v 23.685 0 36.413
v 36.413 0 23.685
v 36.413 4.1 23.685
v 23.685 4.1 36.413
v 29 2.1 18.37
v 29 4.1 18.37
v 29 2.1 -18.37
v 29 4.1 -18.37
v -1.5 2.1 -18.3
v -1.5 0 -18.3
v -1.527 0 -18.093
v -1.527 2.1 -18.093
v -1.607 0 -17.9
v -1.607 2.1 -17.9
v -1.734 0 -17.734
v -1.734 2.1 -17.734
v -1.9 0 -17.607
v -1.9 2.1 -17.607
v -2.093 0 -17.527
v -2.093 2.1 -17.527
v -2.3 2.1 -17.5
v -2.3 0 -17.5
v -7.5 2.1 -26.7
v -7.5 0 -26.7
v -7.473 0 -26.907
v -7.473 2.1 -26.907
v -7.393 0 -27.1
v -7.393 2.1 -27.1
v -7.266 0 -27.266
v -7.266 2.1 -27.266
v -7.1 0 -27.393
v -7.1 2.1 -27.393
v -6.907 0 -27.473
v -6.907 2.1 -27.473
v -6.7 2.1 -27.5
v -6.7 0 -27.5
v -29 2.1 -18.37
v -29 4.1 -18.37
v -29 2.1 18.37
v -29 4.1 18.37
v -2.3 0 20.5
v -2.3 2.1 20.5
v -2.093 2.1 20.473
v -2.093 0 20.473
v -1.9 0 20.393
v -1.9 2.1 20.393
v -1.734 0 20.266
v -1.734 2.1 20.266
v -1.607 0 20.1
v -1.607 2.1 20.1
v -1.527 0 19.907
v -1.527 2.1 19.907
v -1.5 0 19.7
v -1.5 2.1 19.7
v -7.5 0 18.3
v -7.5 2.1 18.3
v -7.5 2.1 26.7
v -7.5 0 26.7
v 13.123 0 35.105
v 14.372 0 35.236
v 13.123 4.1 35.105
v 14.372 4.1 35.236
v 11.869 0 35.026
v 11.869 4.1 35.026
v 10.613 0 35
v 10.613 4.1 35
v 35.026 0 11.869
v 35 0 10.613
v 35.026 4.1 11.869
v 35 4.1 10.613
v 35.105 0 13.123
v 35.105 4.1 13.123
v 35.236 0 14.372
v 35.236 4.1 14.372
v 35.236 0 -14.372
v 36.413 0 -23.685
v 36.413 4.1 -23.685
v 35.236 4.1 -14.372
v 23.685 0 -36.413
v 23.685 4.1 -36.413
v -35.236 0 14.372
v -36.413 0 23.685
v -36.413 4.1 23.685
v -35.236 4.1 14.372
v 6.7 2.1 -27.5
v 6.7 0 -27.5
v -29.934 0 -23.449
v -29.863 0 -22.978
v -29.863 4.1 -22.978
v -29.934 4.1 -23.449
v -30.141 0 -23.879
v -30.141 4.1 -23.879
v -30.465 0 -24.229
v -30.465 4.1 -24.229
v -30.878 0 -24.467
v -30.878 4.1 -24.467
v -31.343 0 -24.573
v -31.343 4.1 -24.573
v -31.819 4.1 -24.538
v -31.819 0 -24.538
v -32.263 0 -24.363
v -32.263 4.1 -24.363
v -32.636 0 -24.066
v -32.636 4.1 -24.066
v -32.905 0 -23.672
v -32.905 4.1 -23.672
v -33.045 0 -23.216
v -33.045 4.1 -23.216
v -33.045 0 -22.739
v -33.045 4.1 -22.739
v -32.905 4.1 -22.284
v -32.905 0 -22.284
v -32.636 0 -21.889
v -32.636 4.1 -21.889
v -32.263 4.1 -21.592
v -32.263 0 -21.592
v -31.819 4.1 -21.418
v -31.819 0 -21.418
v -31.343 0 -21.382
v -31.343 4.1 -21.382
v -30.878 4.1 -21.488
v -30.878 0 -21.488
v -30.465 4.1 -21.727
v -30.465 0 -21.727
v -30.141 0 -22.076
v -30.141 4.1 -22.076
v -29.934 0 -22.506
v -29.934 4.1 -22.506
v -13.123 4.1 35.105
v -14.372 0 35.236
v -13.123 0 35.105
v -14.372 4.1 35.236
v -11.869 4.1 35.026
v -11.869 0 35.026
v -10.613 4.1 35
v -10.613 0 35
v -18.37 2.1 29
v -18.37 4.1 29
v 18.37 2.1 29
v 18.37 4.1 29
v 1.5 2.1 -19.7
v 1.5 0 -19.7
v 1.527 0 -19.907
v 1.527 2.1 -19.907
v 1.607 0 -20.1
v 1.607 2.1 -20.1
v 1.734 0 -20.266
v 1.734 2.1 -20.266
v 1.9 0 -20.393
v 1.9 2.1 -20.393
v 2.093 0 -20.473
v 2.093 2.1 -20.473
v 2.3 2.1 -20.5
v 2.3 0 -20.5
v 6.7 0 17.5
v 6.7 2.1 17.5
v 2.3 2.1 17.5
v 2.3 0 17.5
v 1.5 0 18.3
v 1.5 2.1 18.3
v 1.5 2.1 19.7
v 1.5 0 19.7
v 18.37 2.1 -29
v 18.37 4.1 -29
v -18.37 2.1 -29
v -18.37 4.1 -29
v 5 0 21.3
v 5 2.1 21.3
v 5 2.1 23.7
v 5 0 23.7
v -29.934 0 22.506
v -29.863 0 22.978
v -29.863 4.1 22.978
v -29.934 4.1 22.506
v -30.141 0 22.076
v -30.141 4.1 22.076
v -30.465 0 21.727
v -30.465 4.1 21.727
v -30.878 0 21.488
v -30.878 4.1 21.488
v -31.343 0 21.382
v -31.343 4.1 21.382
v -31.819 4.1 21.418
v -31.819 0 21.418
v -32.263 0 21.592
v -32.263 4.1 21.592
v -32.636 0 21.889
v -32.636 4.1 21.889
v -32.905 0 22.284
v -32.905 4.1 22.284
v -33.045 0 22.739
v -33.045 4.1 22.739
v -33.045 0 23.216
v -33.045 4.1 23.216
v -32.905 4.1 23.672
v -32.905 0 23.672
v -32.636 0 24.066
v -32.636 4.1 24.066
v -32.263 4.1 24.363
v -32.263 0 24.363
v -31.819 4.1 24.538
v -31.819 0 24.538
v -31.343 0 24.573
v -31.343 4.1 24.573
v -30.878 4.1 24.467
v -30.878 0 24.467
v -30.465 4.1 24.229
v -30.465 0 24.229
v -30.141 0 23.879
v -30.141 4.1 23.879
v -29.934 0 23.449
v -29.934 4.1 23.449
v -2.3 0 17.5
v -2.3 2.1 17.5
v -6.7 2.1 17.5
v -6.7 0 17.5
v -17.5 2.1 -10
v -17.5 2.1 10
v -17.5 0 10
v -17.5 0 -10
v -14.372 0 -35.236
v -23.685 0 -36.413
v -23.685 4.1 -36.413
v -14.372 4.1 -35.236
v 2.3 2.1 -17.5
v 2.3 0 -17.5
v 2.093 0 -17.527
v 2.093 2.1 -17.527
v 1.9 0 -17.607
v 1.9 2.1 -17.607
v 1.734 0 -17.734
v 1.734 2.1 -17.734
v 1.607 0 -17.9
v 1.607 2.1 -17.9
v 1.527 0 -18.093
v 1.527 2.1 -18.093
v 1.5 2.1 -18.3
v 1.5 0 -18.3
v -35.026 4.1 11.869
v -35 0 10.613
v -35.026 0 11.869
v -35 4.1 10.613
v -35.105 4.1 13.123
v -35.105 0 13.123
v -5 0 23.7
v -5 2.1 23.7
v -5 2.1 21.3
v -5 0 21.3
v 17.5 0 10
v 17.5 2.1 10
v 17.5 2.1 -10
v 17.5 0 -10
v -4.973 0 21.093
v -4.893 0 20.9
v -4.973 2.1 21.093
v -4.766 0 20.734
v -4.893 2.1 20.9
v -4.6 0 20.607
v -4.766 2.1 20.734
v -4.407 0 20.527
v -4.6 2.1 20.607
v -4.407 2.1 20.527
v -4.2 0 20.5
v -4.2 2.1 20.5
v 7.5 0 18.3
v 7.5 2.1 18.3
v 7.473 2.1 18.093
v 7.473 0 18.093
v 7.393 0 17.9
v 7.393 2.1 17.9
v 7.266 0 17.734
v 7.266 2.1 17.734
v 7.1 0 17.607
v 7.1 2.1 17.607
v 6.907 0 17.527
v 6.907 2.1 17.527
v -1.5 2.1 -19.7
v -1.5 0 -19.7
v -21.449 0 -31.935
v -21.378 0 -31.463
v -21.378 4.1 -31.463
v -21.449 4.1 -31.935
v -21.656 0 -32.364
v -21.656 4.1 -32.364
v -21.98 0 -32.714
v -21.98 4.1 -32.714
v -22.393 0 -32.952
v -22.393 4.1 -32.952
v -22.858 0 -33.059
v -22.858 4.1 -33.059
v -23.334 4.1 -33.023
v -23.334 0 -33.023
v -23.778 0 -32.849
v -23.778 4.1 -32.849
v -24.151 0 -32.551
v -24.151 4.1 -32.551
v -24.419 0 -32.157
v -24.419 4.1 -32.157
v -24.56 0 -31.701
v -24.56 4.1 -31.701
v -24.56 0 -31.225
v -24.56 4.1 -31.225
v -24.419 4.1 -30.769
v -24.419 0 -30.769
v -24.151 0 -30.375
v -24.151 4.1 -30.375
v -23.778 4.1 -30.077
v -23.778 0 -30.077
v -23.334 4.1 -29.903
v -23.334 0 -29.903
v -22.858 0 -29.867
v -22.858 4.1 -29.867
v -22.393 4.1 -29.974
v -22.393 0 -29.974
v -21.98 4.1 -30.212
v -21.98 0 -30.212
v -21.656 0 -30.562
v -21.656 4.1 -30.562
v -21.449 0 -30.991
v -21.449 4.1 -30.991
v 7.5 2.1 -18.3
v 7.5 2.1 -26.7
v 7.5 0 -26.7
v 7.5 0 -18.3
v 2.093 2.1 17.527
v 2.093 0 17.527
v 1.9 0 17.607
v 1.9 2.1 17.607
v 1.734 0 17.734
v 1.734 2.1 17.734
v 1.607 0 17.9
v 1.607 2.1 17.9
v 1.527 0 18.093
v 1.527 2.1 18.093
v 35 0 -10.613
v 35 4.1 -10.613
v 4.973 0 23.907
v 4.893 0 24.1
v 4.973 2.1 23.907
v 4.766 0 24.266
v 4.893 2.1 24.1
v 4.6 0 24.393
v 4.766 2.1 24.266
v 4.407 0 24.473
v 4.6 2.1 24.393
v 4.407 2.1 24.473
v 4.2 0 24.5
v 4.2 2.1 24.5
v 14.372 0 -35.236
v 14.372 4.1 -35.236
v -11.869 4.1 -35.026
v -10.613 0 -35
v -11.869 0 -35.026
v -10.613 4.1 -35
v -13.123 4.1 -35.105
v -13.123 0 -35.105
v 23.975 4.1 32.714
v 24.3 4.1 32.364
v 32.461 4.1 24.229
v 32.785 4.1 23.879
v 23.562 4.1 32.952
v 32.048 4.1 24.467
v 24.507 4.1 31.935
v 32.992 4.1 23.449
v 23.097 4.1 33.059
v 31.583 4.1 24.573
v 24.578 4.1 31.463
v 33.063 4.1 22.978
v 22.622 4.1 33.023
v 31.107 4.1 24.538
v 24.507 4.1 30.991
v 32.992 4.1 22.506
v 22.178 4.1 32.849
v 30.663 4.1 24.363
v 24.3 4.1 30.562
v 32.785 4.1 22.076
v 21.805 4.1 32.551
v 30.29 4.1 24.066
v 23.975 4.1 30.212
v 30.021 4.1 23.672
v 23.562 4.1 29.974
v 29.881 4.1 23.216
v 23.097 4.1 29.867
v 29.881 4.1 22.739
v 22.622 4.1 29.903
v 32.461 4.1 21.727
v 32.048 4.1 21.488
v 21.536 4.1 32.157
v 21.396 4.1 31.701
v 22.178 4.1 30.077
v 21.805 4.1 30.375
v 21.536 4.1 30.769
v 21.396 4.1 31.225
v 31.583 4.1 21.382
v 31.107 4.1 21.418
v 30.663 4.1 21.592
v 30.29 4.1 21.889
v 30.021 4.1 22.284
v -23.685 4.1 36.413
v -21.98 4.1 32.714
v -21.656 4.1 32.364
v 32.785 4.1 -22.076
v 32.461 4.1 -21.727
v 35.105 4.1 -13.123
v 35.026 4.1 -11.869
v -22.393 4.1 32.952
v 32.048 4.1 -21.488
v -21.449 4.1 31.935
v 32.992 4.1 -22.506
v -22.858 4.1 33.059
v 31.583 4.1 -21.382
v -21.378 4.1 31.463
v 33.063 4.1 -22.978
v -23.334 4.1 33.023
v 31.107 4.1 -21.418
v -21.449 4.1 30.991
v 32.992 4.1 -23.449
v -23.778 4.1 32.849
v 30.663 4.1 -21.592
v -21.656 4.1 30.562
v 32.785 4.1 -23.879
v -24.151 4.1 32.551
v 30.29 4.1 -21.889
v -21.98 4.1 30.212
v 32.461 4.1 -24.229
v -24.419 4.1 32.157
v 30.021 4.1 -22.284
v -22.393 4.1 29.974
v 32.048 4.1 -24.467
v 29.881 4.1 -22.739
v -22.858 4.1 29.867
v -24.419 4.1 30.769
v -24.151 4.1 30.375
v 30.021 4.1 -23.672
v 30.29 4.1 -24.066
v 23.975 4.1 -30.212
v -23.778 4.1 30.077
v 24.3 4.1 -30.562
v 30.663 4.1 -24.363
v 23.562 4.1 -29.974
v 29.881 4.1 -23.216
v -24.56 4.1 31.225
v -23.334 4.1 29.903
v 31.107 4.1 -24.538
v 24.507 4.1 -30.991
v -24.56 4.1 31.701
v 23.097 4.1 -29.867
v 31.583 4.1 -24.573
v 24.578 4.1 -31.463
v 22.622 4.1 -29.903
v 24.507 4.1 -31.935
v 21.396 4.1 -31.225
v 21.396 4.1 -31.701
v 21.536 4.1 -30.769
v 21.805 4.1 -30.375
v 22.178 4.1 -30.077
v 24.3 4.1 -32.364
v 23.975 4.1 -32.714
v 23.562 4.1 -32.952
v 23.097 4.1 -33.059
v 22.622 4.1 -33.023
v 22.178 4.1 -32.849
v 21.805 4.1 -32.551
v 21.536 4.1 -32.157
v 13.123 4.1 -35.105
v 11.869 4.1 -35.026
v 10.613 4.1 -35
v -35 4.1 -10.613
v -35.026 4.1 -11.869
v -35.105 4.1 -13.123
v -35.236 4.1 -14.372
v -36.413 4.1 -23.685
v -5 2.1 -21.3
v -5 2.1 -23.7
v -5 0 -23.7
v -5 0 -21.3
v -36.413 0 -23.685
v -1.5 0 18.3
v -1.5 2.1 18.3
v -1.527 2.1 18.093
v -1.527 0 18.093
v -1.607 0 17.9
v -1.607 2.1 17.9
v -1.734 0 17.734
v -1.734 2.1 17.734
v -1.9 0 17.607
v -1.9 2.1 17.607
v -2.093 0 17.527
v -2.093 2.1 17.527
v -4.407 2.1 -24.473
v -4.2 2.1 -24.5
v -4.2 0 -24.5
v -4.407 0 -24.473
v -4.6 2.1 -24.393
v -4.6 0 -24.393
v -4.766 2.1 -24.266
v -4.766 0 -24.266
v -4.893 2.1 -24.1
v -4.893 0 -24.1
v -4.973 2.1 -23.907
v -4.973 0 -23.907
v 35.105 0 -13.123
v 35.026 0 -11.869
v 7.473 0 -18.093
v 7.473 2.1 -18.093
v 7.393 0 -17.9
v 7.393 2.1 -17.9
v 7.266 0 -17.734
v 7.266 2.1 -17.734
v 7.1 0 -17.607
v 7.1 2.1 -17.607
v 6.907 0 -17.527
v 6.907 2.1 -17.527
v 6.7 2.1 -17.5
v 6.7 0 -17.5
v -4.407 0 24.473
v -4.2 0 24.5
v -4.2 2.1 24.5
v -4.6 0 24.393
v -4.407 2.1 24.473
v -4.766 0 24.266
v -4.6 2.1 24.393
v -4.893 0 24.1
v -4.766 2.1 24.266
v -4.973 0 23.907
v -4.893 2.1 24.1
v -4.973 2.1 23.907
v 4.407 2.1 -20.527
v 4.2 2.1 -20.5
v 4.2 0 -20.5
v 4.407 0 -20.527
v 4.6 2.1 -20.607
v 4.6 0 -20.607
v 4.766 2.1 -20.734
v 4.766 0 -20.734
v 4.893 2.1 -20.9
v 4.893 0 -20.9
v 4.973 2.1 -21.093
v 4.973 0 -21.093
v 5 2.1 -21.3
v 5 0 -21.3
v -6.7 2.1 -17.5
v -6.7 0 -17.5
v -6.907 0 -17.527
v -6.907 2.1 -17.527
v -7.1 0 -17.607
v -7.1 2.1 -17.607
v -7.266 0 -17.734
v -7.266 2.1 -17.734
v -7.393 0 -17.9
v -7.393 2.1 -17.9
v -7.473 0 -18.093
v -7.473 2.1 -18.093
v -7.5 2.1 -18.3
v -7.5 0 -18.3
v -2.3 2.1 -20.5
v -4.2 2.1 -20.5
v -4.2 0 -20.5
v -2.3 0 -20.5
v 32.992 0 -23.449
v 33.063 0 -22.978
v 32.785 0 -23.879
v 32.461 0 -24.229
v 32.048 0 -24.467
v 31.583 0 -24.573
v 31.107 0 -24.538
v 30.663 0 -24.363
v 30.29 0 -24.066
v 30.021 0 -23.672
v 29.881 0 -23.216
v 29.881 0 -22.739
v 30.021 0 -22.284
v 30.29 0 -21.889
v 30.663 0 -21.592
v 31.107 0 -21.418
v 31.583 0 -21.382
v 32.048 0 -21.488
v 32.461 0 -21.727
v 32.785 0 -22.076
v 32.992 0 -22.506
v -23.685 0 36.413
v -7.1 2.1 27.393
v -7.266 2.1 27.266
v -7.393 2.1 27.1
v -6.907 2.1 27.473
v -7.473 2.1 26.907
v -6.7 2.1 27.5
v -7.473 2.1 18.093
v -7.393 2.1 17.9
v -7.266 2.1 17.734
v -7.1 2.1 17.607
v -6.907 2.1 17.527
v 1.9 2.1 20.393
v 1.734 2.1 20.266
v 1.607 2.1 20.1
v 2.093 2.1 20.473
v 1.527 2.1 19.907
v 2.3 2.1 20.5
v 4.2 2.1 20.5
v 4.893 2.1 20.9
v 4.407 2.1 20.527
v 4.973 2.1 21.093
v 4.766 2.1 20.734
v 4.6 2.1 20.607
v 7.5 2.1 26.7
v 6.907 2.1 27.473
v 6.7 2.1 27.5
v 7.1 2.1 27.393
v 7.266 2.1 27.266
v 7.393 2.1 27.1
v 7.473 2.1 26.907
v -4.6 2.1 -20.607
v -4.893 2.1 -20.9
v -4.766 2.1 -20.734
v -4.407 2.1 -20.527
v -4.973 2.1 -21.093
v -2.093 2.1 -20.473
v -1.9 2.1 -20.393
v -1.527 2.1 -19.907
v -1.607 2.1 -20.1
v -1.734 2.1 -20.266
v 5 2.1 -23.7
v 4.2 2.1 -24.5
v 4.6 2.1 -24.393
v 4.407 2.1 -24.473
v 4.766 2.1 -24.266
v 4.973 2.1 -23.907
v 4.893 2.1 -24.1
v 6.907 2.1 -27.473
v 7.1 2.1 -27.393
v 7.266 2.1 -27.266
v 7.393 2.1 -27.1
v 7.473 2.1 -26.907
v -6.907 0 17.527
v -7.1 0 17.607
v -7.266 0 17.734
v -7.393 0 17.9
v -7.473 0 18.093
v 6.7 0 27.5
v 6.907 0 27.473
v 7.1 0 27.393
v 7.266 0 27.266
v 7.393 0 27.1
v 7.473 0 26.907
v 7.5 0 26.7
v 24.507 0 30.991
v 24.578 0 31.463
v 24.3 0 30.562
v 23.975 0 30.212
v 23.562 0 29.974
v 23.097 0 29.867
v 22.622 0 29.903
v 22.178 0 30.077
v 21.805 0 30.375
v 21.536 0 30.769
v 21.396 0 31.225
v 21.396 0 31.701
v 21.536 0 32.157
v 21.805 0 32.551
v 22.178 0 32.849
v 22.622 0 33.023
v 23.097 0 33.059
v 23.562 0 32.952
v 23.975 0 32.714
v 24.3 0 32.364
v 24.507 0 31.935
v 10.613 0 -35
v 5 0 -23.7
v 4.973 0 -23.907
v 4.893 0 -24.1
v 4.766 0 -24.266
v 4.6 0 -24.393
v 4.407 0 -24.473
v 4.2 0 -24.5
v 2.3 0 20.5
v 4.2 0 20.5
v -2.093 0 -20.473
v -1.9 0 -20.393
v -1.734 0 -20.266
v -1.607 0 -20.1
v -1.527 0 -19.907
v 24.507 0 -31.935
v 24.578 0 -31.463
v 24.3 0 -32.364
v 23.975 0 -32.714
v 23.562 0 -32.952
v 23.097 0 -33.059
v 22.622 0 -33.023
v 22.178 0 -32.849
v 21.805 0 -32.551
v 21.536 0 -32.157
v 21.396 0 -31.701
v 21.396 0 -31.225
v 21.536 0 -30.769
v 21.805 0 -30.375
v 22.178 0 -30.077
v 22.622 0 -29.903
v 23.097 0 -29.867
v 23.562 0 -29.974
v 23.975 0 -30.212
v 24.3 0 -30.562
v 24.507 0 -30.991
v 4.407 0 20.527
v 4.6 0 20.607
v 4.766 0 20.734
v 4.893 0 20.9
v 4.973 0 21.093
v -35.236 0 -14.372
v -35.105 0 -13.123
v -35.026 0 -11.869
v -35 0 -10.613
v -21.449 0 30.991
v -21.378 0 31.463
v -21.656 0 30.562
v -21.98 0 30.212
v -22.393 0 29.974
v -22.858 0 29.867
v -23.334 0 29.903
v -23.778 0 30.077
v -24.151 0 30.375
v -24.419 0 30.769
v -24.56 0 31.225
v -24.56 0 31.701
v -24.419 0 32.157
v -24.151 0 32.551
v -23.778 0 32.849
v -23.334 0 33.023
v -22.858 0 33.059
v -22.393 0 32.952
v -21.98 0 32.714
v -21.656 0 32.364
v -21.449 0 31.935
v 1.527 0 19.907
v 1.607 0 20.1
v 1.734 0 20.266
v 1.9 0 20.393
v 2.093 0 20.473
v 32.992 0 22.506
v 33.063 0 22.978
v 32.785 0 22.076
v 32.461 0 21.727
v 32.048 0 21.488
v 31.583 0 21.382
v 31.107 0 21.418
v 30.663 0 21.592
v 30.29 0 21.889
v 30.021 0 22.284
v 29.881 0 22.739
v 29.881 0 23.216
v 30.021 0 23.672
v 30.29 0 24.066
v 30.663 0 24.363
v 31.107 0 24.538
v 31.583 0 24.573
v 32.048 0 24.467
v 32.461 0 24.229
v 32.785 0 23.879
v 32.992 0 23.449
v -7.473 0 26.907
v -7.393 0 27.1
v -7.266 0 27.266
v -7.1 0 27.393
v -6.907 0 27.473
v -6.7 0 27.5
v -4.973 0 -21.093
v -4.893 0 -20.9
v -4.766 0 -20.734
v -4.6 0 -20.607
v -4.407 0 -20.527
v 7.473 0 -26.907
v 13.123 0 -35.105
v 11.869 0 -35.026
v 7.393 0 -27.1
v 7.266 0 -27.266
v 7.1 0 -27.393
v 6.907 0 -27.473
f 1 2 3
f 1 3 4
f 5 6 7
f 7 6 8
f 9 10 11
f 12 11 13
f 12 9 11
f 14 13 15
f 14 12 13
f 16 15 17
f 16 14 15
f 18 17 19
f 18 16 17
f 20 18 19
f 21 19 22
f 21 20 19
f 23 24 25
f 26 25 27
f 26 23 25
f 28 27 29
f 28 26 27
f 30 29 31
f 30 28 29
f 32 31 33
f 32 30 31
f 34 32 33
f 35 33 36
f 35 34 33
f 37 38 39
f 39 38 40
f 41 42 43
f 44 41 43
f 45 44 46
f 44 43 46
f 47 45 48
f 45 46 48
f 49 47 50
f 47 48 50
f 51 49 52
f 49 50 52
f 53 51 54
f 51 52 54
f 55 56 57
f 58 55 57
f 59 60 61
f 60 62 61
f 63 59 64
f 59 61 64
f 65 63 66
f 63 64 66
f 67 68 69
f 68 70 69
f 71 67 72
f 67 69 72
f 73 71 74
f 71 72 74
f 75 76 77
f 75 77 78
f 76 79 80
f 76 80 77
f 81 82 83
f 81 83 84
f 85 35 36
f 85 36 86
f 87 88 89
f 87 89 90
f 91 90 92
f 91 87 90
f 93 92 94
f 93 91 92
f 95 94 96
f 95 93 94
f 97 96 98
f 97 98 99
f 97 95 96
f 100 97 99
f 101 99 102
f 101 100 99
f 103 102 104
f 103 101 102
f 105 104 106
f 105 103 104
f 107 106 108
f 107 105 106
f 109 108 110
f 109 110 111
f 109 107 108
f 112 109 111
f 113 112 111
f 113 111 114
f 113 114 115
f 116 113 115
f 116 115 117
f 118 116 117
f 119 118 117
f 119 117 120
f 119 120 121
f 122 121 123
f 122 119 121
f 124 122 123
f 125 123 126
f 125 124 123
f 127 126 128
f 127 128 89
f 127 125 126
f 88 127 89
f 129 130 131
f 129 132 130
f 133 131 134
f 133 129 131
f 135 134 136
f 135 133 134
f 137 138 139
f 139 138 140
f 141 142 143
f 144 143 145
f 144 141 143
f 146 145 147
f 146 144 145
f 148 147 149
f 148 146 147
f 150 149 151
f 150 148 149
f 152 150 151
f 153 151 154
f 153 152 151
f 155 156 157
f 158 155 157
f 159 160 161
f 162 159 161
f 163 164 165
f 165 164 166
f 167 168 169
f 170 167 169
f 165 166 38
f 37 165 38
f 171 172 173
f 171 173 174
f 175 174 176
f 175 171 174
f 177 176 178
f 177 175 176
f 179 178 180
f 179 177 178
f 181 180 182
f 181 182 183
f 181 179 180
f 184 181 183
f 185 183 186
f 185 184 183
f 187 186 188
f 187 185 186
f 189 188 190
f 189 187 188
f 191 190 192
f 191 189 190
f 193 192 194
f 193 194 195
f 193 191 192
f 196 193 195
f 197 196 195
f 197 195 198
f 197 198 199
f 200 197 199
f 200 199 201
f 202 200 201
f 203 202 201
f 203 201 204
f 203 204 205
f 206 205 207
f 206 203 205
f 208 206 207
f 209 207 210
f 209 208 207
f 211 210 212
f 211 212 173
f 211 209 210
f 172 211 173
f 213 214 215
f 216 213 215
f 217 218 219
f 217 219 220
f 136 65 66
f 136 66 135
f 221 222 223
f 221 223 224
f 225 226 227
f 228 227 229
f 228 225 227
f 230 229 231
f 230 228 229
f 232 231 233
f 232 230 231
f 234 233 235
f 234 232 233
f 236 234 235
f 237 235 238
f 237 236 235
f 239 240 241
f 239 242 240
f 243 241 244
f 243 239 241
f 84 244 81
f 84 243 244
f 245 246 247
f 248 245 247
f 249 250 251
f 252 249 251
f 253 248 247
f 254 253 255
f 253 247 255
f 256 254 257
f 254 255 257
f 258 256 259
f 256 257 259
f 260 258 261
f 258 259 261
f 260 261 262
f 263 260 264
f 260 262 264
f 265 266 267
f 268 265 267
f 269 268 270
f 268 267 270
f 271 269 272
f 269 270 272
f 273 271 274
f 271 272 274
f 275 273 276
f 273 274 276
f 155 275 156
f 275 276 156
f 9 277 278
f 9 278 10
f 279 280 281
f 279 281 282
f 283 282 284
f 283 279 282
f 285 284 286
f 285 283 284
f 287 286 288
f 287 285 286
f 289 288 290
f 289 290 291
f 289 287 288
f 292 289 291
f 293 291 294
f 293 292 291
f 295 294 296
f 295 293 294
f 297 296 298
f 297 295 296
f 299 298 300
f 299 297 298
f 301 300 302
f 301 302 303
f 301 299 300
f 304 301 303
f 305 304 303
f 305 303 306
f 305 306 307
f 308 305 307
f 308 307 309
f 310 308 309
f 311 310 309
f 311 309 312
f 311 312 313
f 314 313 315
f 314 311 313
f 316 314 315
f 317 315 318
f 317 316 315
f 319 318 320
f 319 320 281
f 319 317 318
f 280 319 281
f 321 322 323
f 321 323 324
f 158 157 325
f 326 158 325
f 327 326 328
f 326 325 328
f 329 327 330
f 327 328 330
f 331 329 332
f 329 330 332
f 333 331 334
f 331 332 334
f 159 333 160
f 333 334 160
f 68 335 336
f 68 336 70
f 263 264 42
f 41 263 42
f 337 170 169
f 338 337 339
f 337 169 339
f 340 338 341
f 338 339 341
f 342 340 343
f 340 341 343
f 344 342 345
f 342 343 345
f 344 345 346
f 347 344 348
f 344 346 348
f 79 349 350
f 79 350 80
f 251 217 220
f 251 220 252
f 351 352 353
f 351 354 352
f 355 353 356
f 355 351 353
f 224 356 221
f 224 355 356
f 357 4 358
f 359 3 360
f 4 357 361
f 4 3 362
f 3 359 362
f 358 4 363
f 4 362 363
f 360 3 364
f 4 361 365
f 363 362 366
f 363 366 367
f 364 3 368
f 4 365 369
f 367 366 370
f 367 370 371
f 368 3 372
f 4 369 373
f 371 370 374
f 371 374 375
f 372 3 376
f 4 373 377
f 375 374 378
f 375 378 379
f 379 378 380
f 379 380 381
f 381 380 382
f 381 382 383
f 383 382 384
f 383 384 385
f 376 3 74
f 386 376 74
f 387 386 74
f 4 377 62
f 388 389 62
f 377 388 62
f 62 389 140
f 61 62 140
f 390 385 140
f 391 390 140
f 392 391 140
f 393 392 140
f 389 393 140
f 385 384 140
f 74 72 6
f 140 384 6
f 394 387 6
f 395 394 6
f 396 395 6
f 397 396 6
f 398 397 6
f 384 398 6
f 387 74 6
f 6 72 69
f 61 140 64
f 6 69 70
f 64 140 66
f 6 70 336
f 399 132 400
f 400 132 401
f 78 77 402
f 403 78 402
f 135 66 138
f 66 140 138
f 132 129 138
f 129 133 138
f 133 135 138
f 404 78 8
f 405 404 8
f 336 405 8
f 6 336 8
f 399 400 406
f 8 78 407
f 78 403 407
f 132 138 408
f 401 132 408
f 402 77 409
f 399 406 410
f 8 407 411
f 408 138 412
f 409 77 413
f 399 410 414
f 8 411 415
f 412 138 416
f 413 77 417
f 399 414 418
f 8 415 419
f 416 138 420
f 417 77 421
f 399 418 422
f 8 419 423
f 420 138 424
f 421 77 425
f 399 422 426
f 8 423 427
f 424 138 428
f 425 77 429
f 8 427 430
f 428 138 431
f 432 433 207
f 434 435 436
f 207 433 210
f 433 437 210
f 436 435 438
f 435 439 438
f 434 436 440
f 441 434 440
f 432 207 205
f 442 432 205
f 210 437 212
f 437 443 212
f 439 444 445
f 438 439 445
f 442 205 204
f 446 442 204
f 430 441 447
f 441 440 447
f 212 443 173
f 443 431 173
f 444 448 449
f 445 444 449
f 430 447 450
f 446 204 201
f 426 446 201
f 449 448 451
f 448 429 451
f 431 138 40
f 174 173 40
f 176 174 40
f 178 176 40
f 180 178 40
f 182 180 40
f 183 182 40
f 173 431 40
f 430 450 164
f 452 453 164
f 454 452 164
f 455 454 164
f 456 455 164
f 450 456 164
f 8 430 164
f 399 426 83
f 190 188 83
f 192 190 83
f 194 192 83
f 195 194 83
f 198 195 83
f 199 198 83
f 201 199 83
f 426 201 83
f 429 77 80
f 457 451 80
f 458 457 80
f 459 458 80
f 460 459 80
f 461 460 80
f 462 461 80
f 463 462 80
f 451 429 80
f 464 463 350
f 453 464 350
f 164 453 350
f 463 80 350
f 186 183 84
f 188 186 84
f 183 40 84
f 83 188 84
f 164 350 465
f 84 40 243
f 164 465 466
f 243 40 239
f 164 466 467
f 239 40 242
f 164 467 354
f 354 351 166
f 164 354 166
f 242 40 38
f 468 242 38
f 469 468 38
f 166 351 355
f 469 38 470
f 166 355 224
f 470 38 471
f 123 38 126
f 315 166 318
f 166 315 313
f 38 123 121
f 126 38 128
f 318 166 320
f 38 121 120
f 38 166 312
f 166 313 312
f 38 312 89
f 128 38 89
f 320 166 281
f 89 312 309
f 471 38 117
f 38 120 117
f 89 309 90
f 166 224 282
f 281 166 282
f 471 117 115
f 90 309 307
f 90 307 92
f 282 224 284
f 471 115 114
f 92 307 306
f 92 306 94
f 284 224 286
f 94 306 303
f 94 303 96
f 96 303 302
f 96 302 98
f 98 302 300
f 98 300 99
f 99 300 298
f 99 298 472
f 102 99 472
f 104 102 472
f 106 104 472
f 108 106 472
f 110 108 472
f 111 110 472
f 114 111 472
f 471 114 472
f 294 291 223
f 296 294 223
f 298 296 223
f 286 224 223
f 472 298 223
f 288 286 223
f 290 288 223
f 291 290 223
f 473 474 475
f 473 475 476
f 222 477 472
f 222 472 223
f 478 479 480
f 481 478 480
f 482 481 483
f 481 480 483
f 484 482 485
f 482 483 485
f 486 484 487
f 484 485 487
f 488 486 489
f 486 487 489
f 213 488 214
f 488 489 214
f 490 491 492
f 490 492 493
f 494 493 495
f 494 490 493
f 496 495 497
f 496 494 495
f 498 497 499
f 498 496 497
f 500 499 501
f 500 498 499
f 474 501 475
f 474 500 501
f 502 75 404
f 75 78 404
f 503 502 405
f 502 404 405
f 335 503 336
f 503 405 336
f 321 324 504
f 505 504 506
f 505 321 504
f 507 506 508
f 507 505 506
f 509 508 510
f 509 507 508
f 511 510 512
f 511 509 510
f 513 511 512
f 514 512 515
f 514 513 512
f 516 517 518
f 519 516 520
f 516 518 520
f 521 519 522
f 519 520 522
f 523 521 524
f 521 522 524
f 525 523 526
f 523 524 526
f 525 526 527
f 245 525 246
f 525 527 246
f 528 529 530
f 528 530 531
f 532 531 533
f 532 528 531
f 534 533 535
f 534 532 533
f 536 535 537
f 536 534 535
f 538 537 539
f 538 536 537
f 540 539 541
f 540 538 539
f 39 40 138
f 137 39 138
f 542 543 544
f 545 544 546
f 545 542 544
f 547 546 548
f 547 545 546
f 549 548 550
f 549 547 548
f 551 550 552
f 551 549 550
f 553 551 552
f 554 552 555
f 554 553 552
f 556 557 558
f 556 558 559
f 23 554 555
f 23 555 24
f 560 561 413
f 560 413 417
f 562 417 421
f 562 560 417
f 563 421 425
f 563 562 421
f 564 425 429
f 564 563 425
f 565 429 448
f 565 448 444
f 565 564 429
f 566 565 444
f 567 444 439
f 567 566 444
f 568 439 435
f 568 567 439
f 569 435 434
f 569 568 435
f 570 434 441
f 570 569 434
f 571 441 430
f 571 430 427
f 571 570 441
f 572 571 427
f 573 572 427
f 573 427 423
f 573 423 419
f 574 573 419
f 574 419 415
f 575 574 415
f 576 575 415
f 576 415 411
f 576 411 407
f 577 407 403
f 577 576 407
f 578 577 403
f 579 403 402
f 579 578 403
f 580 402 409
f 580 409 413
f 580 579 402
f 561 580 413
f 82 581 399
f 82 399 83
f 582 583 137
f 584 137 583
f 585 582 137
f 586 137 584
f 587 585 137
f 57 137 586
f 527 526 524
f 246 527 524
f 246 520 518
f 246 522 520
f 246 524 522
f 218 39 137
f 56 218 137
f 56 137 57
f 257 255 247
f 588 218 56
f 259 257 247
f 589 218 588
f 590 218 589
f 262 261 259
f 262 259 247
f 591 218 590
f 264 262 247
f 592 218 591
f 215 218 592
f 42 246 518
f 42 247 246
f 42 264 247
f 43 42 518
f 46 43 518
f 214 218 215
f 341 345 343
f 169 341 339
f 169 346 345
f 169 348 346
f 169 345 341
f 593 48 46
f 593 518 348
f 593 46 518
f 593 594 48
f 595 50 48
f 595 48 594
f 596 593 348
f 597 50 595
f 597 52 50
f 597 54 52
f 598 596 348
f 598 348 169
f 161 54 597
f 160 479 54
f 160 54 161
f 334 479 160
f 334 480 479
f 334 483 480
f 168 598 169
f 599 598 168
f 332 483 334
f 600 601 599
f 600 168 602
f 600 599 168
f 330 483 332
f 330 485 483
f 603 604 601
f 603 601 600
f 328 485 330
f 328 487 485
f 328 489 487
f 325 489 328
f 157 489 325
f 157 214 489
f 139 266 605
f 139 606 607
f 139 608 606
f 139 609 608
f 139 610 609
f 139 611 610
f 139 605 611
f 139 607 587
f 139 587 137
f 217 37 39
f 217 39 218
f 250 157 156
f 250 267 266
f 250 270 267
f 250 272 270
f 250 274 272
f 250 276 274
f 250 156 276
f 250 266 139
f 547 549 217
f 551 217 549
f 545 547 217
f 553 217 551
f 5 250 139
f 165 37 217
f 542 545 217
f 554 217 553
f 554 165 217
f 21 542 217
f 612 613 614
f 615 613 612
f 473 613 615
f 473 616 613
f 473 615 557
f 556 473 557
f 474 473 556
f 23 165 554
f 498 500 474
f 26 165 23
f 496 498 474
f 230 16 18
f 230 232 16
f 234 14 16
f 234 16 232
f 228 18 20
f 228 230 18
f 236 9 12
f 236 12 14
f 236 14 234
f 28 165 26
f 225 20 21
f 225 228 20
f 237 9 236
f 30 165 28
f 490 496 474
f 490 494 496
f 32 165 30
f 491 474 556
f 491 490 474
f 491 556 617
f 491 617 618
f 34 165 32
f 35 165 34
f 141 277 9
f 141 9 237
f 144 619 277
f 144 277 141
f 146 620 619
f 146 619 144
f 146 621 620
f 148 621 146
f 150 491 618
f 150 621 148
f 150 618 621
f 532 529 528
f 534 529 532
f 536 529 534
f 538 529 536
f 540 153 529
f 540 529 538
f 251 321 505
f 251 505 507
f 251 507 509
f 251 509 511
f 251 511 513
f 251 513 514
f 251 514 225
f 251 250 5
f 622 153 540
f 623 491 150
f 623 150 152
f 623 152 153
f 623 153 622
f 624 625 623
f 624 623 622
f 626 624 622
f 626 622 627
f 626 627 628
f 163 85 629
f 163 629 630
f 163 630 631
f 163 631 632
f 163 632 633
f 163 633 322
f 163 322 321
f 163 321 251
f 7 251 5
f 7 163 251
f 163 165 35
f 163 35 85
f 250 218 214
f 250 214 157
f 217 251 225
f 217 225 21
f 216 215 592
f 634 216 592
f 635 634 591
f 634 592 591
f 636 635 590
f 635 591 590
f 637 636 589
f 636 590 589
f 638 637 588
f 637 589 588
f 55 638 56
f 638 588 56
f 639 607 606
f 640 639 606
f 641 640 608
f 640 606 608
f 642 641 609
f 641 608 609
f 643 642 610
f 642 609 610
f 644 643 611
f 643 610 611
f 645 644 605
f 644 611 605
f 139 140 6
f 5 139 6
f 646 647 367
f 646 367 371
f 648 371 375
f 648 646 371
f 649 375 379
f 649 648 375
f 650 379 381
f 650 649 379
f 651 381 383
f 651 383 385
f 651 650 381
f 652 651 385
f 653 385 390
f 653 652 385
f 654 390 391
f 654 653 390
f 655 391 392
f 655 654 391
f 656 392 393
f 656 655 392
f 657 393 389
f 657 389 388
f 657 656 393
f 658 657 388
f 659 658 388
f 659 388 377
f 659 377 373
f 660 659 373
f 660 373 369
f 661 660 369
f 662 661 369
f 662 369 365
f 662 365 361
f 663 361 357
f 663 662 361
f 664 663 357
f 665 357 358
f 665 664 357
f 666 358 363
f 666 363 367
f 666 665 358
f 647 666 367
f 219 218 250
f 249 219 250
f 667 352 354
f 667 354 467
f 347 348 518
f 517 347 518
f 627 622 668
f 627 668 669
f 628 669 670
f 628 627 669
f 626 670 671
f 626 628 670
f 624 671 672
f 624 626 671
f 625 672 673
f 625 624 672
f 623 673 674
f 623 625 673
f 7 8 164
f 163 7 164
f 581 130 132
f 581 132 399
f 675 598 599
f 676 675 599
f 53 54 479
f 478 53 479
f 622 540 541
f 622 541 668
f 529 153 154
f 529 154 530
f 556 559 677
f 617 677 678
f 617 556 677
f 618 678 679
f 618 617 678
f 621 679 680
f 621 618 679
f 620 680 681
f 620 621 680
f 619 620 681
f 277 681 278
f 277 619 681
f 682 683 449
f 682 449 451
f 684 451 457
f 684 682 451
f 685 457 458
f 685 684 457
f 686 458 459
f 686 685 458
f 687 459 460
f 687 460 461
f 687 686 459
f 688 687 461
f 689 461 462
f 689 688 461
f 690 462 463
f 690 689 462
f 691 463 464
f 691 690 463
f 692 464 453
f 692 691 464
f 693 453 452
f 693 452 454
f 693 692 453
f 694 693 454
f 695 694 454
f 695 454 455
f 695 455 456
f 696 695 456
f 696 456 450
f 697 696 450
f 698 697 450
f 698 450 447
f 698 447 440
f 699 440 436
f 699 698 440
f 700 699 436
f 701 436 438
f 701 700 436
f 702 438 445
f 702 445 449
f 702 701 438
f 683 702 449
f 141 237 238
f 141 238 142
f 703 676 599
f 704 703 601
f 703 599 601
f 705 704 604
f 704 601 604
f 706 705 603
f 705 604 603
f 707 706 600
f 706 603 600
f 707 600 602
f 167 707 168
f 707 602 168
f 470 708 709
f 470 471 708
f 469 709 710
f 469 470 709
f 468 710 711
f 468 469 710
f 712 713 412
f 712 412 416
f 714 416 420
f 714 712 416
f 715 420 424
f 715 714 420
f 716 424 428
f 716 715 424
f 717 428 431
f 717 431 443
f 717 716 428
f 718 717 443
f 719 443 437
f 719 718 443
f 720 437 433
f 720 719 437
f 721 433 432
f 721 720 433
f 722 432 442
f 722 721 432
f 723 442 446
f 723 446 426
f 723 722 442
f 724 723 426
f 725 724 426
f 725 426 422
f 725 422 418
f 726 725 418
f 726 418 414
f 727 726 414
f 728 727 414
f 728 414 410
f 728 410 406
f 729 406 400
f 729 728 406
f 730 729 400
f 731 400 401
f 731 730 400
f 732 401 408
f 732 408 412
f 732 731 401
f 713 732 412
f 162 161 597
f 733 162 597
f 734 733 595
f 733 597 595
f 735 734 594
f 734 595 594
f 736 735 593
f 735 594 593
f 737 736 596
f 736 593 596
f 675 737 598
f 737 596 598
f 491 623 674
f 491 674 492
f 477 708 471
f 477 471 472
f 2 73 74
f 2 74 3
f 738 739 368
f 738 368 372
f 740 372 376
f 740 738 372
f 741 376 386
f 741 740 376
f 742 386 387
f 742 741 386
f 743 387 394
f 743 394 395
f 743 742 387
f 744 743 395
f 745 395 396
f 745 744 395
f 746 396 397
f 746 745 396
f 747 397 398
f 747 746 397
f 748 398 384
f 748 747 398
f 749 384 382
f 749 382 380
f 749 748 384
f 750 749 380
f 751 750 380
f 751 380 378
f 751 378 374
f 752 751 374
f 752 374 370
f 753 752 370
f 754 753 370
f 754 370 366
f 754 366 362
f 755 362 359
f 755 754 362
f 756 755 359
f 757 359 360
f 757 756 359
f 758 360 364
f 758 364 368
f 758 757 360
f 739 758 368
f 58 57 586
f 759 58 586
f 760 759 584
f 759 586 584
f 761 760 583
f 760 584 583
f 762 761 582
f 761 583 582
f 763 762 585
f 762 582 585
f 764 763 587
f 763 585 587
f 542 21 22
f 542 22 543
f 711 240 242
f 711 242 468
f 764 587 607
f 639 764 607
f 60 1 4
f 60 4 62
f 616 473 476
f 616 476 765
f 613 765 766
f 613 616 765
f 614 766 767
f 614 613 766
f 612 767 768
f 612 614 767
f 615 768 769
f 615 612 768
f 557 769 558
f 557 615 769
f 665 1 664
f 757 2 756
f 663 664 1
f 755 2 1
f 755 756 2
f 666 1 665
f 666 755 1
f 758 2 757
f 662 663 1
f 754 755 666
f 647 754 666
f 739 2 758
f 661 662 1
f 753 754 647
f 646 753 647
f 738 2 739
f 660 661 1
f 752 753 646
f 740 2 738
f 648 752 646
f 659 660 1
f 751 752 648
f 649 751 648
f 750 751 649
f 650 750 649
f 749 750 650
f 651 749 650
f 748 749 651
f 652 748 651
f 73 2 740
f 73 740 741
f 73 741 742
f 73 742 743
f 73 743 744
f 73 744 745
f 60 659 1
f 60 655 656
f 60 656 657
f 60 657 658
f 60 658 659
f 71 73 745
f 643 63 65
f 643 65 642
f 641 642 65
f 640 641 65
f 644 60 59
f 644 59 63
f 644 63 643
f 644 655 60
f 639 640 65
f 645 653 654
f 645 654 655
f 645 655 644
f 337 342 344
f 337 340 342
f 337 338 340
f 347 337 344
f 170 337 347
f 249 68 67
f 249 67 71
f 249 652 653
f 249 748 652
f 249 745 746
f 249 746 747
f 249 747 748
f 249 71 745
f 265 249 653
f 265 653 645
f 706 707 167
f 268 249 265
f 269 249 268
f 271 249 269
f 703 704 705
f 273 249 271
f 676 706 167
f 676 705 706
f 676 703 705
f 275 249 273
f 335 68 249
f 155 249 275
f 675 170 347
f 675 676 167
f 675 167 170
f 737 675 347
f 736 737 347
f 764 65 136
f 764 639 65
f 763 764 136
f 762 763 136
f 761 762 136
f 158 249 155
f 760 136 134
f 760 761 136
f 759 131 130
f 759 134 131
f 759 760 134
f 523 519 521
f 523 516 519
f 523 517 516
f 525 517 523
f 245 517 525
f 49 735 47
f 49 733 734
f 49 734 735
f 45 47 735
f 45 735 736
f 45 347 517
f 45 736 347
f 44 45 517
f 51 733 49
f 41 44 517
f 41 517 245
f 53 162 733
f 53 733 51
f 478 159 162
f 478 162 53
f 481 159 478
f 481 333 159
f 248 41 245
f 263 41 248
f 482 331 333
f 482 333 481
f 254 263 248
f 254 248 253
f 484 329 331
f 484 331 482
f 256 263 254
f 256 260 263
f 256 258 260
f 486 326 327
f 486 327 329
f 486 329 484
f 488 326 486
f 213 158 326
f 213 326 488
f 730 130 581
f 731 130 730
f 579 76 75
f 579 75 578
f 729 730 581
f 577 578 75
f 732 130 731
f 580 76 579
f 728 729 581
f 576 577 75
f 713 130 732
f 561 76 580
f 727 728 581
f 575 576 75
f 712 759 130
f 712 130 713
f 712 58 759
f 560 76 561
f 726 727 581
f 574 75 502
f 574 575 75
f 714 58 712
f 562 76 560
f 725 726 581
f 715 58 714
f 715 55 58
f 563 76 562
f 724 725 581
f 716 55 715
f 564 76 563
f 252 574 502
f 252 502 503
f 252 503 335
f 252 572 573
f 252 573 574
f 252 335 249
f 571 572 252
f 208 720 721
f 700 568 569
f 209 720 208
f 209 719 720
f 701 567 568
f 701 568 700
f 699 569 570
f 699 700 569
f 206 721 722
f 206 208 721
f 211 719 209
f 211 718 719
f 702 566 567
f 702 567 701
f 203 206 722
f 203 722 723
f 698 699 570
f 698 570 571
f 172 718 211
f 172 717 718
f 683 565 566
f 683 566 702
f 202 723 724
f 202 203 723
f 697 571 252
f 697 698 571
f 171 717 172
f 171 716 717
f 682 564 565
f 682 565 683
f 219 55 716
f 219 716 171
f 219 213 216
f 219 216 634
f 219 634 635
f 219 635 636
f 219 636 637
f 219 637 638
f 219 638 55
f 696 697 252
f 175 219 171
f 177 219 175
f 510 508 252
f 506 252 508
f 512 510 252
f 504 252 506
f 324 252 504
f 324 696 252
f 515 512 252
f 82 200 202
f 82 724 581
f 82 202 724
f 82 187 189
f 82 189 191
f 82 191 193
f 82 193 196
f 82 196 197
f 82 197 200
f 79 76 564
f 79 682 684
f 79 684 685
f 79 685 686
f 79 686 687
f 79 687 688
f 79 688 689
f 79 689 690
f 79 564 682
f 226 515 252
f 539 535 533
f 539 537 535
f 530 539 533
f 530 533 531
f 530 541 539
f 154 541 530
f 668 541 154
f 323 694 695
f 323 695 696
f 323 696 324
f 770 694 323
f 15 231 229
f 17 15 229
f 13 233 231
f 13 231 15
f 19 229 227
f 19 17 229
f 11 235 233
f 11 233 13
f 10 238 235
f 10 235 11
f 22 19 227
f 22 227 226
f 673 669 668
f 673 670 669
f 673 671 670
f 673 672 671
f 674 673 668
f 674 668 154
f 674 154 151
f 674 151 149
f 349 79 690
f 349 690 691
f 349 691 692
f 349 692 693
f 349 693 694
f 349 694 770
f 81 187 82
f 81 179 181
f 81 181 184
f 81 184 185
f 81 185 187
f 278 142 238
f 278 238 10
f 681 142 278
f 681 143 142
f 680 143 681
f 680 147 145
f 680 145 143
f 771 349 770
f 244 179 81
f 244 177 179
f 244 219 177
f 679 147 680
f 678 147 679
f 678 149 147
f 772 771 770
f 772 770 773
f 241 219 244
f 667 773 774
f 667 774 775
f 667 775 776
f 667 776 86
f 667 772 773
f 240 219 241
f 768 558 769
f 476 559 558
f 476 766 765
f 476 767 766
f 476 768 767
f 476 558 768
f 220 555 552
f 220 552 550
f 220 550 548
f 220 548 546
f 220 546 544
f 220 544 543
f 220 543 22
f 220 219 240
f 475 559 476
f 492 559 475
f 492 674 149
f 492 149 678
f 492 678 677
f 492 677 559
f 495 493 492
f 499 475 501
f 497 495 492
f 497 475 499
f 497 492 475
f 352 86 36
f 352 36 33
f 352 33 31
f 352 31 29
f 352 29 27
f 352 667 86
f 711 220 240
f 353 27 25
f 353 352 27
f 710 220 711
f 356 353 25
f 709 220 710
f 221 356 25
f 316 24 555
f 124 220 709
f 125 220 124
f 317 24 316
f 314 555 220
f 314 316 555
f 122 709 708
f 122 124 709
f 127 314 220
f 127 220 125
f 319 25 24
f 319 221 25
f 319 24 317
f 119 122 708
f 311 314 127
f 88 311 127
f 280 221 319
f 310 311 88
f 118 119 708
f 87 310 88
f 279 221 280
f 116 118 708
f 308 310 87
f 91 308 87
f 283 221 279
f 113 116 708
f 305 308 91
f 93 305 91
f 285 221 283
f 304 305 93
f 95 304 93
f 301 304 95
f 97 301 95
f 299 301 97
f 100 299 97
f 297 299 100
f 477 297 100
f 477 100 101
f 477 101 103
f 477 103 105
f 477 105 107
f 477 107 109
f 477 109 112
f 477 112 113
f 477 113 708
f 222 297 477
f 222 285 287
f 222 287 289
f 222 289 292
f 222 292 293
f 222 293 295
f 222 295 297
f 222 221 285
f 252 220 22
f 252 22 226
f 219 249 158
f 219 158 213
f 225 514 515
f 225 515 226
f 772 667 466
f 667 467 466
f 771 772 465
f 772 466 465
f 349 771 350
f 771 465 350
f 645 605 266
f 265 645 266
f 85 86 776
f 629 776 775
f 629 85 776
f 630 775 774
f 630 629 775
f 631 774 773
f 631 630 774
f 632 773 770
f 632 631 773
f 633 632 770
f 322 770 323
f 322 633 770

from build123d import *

# Parameters (mm, degrees)
SKETCH1_R           = 1.6
BOSS_EXTRUDE1_DEPTH = 4.1
CUT_EXTRUDE1_DEPTH  = 2
FILLET2_R           = 30
CUT_EXTRUDE4_DEPTH  = 52.538200475
SKETCH7_W           = 35
SKETCH7_H           = 20
CUT_EXTRUDE5_DEPTH  = 52.538200475


with BuildPart() as part:
    # Sketch1 → Boss-Extrude1 (new body)
    with BuildSketch(Plane(origin=(0, 0, 0), x_dir=(1, 0, 0), z_dir=(0, 1, 0))):
        Polygon((-12.5, 35), (12.5, 35), (23.684823703, 36.412745764), (36.412745764, 23.684823703), (35, 12.5), (35, -12.5), (36.412745764, -23.684823703), (23.684823703, -36.412745764), (12.5, -35), (-12.5, -35), (-23.684823703, -36.412745764), (-36.412745764, -23.684823703), (-35, -12.5), (-35, 12.5), (-36.412745764, 23.684823703), (-23.684823703, 36.412745764), align=None)
        with Locations((22.977716922, 31.462998296)):
            Circle(SKETCH1_R, mode=Mode.SUBTRACT)
        with Locations((31.462998296, 22.977716922)):
            Circle(SKETCH1_R, mode=Mode.SUBTRACT)
        with Locations((31.462998296, -22.977716922)):
            Circle(SKETCH1_R, mode=Mode.SUBTRACT)
        with Locations((22.977716922, -31.462998296)):
            Circle(SKETCH1_R, mode=Mode.SUBTRACT)
        with Locations((-22.977716922, -31.462998296)):
            Circle(SKETCH1_R, mode=Mode.SUBTRACT)
        with Locations((-31.462998296, -22.977716922)):
            Circle(SKETCH1_R, mode=Mode.SUBTRACT)
        with Locations((-31.462998296, 22.977716922)):
            Circle(SKETCH1_R, mode=Mode.SUBTRACT)
        with Locations((-22.977716922, 31.462998296)):
            Circle(SKETCH1_R, mode=Mode.SUBTRACT)
    extrude(amount=BOSS_EXTRUDE1_DEPTH)

    # Sketch2 → Cut-Extrude1 (cut)
    with BuildSketch(Plane(origin=(0, 4.1, 0), x_dir=(1, 0, 0), z_dir=(0, 1, 0))):
        Polygon((18.369647406, 29), (-18.369647406, 29), (-29, 18.369647406), (-29, -18.369647406), (-18.369647406, -29), (18.369647406, -29), (29, -18.369647406), (29, 18.369647406), align=None)
    extrude(amount=-CUT_EXTRUDE1_DEPTH, mode=Mode.SUBTRACT)

    # Fillet2
    fillet2_edges = [part.edges().sort_by_distance(p)[0] for p in [
        (-35, 2.05, 12.5),
        (-35, 2.05, -12.5),
        (-12.5, 2.05, -35),
        (12.5, 2.05, -35),
        (35, 2.05, -12.5),
        (35, 2.05, 12.5),
        (12.5, 2.05, 35),
        (-12.5, 2.05, 35),
    ]]
    fillet(fillet2_edges, radius=FILLET2_R)

    # Sketch6 → Cut-Extrude4 (cut, through all)
    with BuildSketch(Plane(origin=(0, 2.1, 0), x_dir=(1, 0, 0), z_dir=(0, 1, 0))):
        with BuildLine():
            Line((-1.5, 19.7), (-1.5, 18.3))
            ThreePointArc((-1.5, 18.3), (-1.734314575, 17.734314575), (-2.3, 17.5))
            Line((-2.3, 17.5), (-6.7, 17.5))
            ThreePointArc((-6.7, 17.5), (-7.265685425, 17.734314575), (-7.5, 18.3))
            Line((-7.5, 18.3), (-7.5, 26.7))
            ThreePointArc((-7.5, 26.7), (-7.265685425, 27.265685425), (-6.7, 27.5))
            Line((-6.7, 27.5), (6.7, 27.5))
            ThreePointArc((6.7, 27.5), (7.265685425, 27.265685425), (7.5, 26.7))
            Line((7.5, 26.7), (7.5, 18.3))
            ThreePointArc((7.5, 18.3), (7.265685425, 17.734314575), (6.7, 17.5))
            Line((6.7, 17.5), (2.3, 17.5))
            ThreePointArc((2.3, 17.5), (1.734314575, 17.734314575), (1.5, 18.3))
            Line((1.5, 18.3), (1.5, 19.7))
            ThreePointArc((1.5, 19.7), (1.734314575, 20.265685425), (2.3, 20.5))
            Line((2.3, 20.5), (4.2, 20.5))
            ThreePointArc((4.2, 20.5), (4.765685425, 20.734314575), (5, 21.3))
            Line((5, 21.3), (5, 23.7))
            ThreePointArc((5, 23.7), (4.765685425, 24.265685425), (4.2, 24.5))
            Line((4.2, 24.5), (-4.2, 24.5))
            ThreePointArc((-4.2, 24.5), (-4.765685425, 24.265685425), (-5, 23.7))
            Line((-5, 23.7), (-5, 21.3))
            ThreePointArc((-5, 21.3), (-4.765685425, 20.734314575), (-4.2, 20.5))
            Line((-4.2, 20.5), (-2.3, 20.5))
            ThreePointArc((-2.3, 20.5), (-1.734314575, 20.265685425), (-1.5, 19.7))
        make_face()
        with BuildLine():
            Line((-1.5, -19.7), (-1.5, -18.3))
            ThreePointArc((-1.5, -18.3), (-1.734314575, -17.734314575), (-2.3, -17.5))
            Line((-2.3, -17.5), (-6.7, -17.5))
            ThreePointArc((-6.7, -17.5), (-7.265685425, -17.734314575), (-7.5, -18.3))
            Line((-7.5, -18.3), (-7.5, -26.7))
            ThreePointArc((-7.5, -26.7), (-7.265685425, -27.265685425), (-6.7, -27.5))
            Line((-6.7, -27.5), (6.7, -27.5))
            ThreePointArc((6.7, -27.5), (7.265685425, -27.265685425), (7.5, -26.7))
            Line((7.5, -26.7), (7.5, -18.3))
            ThreePointArc((7.5, -18.3), (7.265685425, -17.734314575), (6.7, -17.5))
            Line((6.7, -17.5), (2.3, -17.5))
            ThreePointArc((2.3, -17.5), (1.734314575, -17.734314575), (1.5, -18.3))
            Line((1.5, -18.3), (1.5, -19.7))
            ThreePointArc((1.5, -19.7), (1.734314575, -20.265685425), (2.3, -20.5))
            Line((2.3, -20.5), (4.2, -20.5))
            ThreePointArc((4.2, -20.5), (4.765685425, -20.734314575), (5, -21.3))
            Line((5, -21.3), (5, -23.7))
            ThreePointArc((5, -23.7), (4.765685425, -24.265685425), (4.2, -24.5))
            Line((4.2, -24.5), (-4.2, -24.5))
            ThreePointArc((-4.2, -24.5), (-4.765685425, -24.265685425), (-5, -23.7))
            Line((-5, -23.7), (-5, -21.3))
            ThreePointArc((-5, -21.3), (-4.765685425, -20.734314575), (-4.2, -20.5))
            Line((-4.2, -20.5), (-2.3, -20.5))
            ThreePointArc((-2.3, -20.5), (-1.734314575, -20.265685425), (-1.5, -19.7))
        make_face()
    extrude(amount=-CUT_EXTRUDE4_DEPTH, mode=Mode.SUBTRACT)

    # Sketch7 → Cut-Extrude5 (cut, through all)
    with BuildSketch(Plane(origin=(0, 2.1, 0), x_dir=(1, 0, 0), z_dir=(0, 1, 0))):
        Rectangle(SKETCH7_W, SKETCH7_H)
    extrude(amount=-CUT_EXTRUDE5_DEPTH, mode=Mode.SUBTRACT)


solid = part.part
